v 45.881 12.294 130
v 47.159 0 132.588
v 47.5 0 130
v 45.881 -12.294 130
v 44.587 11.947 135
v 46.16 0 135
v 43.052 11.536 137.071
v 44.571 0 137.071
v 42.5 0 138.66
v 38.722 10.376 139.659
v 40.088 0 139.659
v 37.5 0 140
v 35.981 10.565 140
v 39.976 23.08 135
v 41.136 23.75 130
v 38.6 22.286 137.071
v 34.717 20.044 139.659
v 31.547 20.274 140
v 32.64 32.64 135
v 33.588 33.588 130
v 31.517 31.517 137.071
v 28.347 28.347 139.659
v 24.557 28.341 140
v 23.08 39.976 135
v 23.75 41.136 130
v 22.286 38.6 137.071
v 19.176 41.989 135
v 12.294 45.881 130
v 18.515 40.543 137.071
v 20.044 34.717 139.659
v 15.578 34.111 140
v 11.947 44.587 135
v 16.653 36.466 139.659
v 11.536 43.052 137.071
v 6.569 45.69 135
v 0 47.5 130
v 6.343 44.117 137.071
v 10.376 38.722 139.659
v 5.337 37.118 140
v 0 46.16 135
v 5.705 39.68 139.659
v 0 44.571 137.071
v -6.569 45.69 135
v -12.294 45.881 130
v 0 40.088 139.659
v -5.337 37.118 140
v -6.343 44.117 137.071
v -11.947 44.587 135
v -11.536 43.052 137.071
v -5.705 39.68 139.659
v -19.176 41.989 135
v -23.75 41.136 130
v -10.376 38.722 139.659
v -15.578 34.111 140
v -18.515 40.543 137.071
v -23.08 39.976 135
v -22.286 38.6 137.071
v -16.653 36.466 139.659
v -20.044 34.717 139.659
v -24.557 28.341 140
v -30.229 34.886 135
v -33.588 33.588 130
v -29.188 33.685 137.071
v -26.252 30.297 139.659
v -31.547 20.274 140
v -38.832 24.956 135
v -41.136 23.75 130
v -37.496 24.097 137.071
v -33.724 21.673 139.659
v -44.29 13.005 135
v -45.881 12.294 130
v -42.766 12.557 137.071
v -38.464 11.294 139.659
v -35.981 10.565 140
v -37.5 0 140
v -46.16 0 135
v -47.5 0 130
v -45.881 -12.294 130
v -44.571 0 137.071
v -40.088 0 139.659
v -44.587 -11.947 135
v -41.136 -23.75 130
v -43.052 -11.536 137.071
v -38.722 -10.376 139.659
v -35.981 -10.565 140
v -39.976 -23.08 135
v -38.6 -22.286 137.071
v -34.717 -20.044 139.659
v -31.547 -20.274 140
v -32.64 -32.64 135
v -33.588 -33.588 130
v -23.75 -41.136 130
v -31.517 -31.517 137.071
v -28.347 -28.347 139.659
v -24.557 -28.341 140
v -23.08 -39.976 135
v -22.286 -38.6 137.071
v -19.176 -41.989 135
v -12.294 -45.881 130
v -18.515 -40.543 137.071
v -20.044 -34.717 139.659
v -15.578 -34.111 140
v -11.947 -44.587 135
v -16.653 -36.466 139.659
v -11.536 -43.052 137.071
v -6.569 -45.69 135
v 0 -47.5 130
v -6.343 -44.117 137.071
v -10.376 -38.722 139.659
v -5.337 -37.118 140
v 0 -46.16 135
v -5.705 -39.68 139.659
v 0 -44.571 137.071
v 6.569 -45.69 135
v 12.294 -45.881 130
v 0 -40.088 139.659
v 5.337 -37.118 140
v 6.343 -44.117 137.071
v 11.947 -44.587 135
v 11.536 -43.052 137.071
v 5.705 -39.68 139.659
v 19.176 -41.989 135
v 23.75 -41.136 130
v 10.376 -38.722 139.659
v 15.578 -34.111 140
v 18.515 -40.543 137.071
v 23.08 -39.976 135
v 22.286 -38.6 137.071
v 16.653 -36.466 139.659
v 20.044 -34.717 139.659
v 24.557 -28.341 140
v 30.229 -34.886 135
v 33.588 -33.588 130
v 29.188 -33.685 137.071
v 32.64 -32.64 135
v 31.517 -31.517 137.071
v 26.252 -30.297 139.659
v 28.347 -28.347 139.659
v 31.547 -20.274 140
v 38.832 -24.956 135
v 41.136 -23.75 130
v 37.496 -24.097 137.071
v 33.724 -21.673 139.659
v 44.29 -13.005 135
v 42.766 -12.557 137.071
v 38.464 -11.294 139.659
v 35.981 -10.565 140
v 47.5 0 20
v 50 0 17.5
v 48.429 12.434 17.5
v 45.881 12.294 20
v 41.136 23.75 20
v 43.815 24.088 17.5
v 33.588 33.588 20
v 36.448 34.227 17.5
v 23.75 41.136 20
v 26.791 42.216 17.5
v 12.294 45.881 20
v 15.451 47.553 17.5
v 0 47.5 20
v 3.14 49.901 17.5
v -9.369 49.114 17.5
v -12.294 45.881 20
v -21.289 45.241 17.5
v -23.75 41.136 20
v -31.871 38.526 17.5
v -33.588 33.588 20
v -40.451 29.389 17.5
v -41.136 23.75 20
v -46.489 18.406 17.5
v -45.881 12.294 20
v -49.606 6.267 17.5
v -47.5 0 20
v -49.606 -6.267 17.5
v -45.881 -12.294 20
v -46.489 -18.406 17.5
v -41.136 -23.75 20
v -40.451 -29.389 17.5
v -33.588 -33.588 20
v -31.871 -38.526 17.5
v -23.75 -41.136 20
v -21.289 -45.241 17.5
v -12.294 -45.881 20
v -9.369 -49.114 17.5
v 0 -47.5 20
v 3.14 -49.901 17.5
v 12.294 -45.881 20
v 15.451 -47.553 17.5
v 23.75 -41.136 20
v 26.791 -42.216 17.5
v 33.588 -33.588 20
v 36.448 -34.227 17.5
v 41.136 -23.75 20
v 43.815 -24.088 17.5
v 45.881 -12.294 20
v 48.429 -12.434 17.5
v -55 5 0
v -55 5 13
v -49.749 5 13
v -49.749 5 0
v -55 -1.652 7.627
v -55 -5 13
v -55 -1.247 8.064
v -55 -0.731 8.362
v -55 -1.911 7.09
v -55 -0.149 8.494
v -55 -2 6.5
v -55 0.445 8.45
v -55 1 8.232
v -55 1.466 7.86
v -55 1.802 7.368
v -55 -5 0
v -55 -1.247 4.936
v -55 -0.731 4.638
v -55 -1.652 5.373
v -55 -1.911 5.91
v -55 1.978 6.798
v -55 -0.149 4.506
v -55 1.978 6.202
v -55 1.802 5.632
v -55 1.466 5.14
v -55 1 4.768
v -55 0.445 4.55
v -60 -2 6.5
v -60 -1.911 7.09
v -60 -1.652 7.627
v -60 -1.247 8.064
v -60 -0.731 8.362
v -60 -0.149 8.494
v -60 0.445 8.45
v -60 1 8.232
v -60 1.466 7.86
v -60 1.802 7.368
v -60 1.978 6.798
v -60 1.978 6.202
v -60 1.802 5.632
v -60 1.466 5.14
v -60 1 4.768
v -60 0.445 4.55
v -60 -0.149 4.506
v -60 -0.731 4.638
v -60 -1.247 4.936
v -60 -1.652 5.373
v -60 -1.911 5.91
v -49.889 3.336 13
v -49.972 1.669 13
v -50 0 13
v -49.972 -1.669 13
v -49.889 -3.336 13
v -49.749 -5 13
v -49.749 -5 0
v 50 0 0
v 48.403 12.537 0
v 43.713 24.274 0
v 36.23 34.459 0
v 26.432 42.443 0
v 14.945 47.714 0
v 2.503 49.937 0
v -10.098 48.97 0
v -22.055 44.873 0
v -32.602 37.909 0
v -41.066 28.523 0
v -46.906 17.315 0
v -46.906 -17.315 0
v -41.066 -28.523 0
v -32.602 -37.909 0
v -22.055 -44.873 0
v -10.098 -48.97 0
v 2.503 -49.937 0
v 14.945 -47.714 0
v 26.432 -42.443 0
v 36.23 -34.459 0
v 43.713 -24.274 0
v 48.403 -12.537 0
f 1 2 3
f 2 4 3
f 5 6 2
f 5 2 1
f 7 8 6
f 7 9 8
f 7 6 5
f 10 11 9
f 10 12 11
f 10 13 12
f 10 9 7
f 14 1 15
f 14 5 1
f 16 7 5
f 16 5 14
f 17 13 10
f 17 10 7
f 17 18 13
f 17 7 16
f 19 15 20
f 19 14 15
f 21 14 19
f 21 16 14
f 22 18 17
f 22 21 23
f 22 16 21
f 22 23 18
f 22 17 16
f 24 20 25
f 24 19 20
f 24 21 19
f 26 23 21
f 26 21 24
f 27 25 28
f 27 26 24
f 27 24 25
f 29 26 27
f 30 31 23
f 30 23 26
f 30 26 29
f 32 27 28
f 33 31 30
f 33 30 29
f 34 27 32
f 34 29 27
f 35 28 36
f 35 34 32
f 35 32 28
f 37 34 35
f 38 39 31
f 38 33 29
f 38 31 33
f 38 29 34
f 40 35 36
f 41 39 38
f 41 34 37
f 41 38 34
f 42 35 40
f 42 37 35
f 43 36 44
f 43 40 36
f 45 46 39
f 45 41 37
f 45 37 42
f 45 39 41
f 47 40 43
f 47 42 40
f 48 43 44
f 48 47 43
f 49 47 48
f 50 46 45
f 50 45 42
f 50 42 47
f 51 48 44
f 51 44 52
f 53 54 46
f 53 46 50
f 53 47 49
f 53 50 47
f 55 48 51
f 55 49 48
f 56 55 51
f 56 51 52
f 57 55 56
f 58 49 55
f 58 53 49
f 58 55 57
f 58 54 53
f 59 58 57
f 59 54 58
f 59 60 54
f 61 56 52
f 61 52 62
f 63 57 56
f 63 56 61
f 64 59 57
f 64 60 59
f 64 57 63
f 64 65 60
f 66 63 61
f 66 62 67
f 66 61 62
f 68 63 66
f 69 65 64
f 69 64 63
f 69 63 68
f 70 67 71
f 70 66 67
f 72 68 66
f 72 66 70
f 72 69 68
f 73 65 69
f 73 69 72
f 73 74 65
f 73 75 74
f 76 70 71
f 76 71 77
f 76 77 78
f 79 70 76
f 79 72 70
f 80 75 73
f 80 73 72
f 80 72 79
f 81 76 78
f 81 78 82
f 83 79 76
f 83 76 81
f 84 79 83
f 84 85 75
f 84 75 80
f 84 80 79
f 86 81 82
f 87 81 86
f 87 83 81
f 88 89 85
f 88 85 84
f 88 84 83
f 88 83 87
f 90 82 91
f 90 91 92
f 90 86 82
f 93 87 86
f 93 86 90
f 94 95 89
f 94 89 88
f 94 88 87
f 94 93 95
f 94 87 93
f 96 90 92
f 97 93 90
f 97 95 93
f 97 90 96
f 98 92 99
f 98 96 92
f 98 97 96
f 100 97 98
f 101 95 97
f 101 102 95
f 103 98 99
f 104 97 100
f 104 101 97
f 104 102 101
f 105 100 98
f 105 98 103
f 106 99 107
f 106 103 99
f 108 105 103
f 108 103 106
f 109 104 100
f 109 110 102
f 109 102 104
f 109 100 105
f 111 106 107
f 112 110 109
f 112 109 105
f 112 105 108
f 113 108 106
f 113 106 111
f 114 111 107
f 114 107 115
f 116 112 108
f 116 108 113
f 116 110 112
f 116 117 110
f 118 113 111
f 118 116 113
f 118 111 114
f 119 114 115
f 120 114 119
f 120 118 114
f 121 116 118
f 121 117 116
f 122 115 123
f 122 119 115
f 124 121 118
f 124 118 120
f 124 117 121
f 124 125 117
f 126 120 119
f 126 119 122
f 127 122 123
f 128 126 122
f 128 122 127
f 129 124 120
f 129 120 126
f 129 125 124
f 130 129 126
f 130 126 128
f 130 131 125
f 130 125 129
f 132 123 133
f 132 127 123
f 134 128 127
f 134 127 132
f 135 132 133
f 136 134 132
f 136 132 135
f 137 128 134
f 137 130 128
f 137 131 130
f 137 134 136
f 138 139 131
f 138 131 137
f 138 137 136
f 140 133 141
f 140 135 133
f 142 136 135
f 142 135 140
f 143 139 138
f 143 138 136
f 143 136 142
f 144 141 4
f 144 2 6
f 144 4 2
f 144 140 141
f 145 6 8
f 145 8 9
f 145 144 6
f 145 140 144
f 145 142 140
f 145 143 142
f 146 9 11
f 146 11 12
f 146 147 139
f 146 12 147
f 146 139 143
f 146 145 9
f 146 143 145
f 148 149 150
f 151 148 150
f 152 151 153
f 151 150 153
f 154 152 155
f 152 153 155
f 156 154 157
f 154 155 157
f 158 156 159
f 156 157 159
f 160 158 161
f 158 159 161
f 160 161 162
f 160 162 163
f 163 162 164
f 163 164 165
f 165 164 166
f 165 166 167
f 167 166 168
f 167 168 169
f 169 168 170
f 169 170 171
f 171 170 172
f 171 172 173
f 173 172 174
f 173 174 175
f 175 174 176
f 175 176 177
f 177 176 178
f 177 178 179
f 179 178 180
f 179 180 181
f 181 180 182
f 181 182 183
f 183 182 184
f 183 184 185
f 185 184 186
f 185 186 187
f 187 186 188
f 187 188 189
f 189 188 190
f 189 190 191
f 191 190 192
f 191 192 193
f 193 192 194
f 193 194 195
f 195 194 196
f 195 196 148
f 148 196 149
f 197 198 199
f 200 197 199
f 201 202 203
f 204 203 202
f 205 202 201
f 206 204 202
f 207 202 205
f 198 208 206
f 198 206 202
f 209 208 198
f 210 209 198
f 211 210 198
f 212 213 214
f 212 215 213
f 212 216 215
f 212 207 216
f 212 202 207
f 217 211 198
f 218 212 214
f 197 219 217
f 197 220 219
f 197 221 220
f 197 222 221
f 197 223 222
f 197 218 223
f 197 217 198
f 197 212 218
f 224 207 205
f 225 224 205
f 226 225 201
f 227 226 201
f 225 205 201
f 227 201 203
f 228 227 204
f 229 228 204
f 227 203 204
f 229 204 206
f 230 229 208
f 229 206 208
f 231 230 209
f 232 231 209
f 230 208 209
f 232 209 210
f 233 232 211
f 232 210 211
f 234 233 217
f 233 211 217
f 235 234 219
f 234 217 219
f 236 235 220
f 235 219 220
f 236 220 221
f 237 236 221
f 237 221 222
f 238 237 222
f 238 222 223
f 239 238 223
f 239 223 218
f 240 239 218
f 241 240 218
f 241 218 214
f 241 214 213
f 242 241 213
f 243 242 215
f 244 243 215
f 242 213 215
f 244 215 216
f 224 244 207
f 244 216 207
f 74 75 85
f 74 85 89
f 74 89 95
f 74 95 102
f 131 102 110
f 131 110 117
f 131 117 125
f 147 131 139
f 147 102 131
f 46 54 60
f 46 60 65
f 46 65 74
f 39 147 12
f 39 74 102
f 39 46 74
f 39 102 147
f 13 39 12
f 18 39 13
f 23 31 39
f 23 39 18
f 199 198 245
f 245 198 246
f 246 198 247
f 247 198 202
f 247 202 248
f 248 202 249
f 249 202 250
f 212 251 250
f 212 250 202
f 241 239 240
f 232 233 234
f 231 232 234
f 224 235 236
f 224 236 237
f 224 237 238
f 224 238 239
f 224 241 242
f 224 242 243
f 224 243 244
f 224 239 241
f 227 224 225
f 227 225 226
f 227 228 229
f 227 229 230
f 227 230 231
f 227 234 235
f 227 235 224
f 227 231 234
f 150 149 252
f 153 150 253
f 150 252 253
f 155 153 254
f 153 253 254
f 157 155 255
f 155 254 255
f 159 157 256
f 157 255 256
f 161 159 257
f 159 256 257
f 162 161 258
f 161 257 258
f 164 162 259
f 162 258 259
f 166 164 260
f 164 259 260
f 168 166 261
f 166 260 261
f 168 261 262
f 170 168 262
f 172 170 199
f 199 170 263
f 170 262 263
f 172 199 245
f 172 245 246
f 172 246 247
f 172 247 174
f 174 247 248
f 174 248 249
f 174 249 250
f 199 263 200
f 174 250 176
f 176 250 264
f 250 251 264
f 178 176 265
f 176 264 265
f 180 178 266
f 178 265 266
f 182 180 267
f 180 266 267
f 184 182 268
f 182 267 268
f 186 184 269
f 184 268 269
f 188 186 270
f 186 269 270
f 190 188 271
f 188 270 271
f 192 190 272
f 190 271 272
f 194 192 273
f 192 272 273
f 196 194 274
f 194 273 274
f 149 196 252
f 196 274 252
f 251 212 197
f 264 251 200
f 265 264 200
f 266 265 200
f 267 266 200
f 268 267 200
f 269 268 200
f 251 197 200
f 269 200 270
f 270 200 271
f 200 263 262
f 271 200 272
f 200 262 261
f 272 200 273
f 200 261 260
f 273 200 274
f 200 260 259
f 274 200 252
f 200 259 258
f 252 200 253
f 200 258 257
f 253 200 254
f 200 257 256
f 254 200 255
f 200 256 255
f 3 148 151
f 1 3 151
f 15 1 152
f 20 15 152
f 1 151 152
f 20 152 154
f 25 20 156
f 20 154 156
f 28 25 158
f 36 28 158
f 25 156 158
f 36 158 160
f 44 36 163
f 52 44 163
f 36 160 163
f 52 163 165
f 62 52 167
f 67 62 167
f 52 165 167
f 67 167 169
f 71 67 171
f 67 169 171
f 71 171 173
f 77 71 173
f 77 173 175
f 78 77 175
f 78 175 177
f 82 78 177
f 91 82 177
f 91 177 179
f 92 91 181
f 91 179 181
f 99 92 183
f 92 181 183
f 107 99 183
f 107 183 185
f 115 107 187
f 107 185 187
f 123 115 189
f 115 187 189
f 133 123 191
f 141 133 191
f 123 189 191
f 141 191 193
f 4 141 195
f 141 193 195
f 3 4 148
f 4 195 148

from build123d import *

# Parameters (mm, degrees)
F0_R     = 50
F1_DEPTH = 20
F2_R     = 47.5
F3_DEPTH = 120
F4_R     = 10
F5_SIZE  = 2.49999
F7_DEPTH = 13
F8_R     = 2
F9_DEPTH = 5


# Not quite as in the source:
# - a fillet or chamfer is up to 0.001 mm smaller than in the source, because OpenCascade refuses the exact size


with BuildPart() as f1:
    # F0 (on Top) → F1 (new body)
    with BuildSketch(Plane.XY):
        Circle(F0_R)
    extrude(amount=F1_DEPTH)

    # F2 (on face) → F3 (join)
    with BuildSketch(Plane.XY.offset(20)):
        Circle(F2_R)
    extrude(amount=F3_DEPTH)

    # F4
    f4_edges = [f1.edges().sort_by_distance(p)[0] for p in [
        (-47.5, 0, 140),
    ]]
    fillet(f4_edges, radius=F4_R)

    # F5 (size 2.5 in the source; OpenCascade refuses exactly that, so slightly less here)
    f5_edges = [f1.edges().sort_by_distance(p)[0] for p in [
        (-50, 0, 20),
    ]]
    chamfer(f5_edges, length=F5_SIZE)

    # F6 (on face) → F7 (join)
    with BuildSketch(Plane(origin=(0, 0, 0), x_dir=(1, 0, 0), z_dir=(0, 0, -1))):
        with BuildLine():
            Line((-50, 0), (-55, 0))
            Line((-55, 0), (-55, -5))
            Line((-55, -5), (-49.7493718553, -5))
            ThreePointArc((-49.7493718553, -5), (-49.9373036555, -2.503138753), (-50, 0))
        make_face()
        with BuildLine():
            Line((-55, 5), (-55, 0))
            Line((-55, 0), (-50, 0))
            ThreePointArc((-50, 0), (-49.9373036555, 2.503138753), (-49.7493718553, 5))
            Line((-49.7493718553, 5), (-55, 5))
        make_face()
    extrude(amount=-F7_DEPTH)

    # F8 (on face) → F9 (join)
    with BuildSketch(Plane(origin=(-55, 0, 0), x_dir=(0, -1, 0), z_dir=(-1, 0, 0))):
        with Locations((0, 6.5)):
            Circle(F8_R)
    extrude(amount=F9_DEPTH)


solid = f1.part
